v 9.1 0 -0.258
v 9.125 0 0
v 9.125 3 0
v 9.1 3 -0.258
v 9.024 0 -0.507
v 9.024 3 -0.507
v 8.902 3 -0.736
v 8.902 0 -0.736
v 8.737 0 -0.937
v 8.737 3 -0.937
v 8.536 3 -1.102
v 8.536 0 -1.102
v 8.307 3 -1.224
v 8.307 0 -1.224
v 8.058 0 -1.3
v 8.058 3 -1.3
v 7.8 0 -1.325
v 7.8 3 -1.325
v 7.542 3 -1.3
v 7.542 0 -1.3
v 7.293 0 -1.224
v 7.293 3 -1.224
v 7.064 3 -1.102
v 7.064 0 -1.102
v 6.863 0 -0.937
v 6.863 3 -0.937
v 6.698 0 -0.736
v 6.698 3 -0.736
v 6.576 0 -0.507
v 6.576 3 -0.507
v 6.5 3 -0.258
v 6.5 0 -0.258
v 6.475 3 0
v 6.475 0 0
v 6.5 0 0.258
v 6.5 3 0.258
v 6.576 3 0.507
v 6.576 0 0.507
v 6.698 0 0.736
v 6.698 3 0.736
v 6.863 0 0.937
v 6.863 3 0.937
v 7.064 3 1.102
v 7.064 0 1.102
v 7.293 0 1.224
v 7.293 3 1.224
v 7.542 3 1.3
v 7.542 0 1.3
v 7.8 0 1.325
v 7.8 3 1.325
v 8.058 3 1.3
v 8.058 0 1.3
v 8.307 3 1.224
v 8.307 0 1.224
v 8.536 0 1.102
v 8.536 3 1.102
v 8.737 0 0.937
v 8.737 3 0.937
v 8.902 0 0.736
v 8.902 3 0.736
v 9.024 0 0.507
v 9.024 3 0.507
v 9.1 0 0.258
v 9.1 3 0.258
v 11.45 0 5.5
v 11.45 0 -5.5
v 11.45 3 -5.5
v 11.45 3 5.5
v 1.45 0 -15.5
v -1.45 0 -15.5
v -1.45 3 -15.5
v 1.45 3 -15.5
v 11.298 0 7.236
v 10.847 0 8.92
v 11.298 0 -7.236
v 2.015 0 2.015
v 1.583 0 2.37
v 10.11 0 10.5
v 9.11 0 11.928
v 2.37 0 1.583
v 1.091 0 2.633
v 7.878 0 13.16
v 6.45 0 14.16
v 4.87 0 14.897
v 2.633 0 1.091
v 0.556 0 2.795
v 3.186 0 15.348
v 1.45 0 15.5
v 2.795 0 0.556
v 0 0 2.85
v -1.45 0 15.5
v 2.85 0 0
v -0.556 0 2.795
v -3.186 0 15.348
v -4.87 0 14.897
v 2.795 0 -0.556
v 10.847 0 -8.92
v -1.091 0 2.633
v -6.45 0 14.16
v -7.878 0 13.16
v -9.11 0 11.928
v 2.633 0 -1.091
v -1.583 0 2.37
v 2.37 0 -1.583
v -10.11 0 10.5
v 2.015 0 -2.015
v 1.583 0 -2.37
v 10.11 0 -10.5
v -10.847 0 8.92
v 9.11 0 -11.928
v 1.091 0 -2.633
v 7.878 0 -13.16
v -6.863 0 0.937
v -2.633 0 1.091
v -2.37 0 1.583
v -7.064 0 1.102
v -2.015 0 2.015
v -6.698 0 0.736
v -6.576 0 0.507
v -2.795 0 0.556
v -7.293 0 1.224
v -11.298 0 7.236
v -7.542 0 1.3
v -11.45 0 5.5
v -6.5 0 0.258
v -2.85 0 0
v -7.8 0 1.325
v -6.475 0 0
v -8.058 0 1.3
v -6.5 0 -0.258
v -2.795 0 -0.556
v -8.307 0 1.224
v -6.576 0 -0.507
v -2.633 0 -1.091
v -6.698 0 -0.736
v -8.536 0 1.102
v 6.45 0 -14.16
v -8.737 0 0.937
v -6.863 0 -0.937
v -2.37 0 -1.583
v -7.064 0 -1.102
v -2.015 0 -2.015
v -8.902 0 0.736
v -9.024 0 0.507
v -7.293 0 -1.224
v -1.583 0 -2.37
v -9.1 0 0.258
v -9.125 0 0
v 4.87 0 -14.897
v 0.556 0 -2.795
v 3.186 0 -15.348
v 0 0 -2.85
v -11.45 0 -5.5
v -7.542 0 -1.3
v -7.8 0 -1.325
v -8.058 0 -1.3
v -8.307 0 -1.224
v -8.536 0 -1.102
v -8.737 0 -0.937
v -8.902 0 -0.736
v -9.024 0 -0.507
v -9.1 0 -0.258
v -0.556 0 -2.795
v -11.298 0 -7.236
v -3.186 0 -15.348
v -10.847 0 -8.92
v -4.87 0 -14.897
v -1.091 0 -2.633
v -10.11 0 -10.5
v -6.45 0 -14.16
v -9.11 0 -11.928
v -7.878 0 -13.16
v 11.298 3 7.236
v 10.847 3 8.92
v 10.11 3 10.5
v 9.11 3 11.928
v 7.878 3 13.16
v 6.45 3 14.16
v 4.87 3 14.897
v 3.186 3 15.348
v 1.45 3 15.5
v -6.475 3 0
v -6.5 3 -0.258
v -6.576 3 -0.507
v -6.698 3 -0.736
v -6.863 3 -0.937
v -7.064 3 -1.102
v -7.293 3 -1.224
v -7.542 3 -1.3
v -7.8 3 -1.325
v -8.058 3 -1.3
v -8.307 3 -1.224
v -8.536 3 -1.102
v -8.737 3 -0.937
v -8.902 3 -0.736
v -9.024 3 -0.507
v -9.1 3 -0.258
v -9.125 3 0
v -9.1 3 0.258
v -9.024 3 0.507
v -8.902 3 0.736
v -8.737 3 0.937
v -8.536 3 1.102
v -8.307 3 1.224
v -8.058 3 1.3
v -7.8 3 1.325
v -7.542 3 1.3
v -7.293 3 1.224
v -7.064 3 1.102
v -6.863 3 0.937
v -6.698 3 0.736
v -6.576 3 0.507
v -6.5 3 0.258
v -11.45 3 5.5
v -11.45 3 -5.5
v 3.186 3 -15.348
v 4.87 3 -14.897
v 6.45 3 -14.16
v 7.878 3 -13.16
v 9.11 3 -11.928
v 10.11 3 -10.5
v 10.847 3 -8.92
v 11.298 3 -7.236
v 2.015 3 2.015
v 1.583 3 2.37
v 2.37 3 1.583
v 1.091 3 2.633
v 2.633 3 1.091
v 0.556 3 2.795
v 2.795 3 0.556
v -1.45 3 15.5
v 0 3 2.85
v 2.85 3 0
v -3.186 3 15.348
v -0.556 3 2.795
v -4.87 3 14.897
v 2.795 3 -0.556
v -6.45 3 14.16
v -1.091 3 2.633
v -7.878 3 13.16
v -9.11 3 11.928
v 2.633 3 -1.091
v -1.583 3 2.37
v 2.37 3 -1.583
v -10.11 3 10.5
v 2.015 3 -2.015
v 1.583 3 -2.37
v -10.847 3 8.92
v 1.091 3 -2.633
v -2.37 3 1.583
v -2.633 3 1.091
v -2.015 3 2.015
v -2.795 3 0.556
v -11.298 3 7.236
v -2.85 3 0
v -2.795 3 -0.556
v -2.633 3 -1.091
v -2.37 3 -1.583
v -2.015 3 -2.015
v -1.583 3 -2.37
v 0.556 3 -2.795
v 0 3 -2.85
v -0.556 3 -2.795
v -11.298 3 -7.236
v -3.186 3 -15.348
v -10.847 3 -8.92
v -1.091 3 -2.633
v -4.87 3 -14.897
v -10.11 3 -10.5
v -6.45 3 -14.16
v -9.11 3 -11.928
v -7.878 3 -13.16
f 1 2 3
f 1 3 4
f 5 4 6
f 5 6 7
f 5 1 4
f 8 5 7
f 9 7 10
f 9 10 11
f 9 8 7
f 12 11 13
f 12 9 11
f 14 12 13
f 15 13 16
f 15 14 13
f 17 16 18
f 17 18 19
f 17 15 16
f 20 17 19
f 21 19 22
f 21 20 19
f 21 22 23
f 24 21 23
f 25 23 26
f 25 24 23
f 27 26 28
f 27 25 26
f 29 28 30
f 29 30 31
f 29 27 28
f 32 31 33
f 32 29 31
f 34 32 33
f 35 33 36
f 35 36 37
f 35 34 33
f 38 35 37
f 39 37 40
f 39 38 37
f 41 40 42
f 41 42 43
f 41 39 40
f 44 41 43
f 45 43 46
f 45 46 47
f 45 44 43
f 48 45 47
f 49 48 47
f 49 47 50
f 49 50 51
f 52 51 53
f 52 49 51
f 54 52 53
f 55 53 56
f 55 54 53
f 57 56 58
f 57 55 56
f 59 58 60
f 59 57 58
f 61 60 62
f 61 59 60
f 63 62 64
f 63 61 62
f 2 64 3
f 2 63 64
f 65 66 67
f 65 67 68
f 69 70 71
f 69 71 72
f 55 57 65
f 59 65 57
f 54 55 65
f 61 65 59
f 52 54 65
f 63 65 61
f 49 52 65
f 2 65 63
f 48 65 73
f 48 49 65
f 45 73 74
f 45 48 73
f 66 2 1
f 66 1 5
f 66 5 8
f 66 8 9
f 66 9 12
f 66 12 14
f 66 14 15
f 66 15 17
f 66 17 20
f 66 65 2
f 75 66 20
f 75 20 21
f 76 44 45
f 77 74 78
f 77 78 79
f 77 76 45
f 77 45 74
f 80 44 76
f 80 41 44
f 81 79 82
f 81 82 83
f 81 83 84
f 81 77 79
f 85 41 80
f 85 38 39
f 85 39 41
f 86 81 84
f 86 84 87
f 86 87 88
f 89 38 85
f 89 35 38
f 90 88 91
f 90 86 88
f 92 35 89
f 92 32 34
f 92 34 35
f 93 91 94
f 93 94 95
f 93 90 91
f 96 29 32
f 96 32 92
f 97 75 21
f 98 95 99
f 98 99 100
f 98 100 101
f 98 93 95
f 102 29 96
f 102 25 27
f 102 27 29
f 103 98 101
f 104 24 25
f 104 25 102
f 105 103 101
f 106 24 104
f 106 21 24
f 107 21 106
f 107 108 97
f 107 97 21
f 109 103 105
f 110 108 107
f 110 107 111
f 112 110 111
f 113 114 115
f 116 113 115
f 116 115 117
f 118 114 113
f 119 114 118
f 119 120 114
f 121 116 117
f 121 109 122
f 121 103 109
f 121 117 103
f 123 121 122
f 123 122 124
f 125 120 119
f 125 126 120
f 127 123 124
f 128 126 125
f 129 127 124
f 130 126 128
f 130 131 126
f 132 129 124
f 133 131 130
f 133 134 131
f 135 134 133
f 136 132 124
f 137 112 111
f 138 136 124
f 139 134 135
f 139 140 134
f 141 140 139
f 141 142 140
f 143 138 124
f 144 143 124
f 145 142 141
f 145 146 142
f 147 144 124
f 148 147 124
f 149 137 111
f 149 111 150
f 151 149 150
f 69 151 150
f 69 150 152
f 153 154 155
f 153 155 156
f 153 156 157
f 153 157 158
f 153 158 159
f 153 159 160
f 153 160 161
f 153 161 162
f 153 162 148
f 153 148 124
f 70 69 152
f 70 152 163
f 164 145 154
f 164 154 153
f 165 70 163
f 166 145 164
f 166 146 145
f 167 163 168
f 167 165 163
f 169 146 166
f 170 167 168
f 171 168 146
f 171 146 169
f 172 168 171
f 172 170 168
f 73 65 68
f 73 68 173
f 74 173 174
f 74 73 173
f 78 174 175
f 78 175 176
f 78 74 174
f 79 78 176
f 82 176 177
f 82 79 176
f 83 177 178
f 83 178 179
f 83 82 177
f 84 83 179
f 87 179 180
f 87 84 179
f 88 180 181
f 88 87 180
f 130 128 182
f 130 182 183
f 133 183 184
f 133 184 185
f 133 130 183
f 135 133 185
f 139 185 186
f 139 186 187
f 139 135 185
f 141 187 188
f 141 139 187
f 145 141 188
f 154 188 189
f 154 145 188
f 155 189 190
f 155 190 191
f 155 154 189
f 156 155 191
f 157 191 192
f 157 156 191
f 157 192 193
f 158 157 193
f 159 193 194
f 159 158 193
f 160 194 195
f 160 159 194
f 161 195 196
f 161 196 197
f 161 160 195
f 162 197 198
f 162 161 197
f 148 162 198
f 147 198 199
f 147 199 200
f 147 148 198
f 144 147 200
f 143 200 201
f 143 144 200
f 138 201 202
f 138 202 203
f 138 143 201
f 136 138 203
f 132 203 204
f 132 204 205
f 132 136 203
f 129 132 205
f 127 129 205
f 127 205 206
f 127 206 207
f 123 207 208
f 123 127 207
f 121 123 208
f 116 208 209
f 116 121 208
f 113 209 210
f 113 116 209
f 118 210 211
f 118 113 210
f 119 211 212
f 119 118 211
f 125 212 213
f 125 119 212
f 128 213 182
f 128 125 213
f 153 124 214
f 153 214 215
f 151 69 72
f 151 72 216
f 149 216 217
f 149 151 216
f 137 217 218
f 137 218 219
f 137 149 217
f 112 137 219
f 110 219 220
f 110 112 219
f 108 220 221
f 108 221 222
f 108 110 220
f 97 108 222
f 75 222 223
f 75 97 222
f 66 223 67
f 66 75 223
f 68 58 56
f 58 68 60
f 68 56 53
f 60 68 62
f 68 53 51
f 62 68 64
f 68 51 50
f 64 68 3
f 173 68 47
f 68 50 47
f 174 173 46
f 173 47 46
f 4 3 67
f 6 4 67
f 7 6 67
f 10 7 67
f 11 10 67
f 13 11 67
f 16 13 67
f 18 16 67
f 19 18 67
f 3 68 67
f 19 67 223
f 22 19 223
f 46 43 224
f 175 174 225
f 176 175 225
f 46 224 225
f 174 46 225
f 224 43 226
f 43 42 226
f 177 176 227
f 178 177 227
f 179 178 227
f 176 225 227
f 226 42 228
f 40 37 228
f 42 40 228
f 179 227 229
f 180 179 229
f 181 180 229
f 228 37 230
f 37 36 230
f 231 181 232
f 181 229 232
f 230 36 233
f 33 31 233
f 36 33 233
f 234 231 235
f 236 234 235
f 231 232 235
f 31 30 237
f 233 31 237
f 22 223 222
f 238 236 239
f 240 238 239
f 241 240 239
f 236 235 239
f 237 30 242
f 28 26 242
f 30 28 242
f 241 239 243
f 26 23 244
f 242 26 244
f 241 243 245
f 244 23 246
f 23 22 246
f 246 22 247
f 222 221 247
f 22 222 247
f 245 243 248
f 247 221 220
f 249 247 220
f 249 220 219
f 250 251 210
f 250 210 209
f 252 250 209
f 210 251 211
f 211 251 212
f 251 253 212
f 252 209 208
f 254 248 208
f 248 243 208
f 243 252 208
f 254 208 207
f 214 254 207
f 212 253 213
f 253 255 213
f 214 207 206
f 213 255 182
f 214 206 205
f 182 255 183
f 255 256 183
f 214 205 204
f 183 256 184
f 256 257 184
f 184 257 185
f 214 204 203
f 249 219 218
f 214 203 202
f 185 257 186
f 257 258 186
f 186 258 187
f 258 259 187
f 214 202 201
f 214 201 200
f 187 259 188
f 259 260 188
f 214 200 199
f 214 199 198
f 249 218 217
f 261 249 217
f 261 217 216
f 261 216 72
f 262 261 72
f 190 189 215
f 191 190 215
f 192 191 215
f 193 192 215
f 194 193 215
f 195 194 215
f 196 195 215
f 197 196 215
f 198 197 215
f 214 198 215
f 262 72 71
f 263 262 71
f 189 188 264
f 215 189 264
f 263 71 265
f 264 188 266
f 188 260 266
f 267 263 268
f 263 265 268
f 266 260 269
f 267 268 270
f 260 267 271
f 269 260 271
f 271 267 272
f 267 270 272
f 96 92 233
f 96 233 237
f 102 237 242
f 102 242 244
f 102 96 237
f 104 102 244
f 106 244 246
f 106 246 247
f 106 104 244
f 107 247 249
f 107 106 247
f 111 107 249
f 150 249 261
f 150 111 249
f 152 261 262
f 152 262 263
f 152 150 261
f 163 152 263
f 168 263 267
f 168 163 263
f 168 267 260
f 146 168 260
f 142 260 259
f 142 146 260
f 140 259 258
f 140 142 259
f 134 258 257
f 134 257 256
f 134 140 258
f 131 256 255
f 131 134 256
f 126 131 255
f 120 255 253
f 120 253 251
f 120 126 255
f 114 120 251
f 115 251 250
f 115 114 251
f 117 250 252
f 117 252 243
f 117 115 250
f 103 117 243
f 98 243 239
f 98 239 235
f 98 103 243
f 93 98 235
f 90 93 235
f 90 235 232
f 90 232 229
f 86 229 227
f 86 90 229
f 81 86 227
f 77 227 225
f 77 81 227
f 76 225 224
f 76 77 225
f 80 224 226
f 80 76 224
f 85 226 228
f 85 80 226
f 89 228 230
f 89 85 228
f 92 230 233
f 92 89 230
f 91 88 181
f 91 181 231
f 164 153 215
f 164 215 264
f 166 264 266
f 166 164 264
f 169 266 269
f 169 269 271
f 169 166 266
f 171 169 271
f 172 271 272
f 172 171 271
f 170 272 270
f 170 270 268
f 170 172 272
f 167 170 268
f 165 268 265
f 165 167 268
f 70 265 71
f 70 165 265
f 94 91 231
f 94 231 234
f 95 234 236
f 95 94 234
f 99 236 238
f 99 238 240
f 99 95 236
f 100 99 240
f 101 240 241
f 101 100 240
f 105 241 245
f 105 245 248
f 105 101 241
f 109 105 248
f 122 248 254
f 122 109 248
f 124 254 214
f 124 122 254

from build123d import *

# Parameters (mm, degrees)
SKETCH1_R           = 1.325
SKETCH1_R_2         = 2.85
BOSS_EXTRUDE1_DEPTH = 3


with BuildPart() as part:
    # Sketch1 → Boss-Extrude1 (new body)
    with BuildSketch(Plane(origin=(0, 0, 0), x_dir=(1, 0, 0), z_dir=(0, 1, 0))):
        with BuildLine():
            Line((-1.45, 15.5), (1.45, 15.5))
            ThreePointArc((1.45, 15.5), (8.521067812, 12.571067812), (11.45, 5.5))
            Line((11.45, 5.5), (11.45, -5.5))
            ThreePointArc((11.45, -5.5), (8.521067812, -12.571067812), (1.45, -15.5))
            Line((1.45, -15.5), (-1.45, -15.5))
            ThreePointArc((-1.45, -15.5), (-8.521067812, -12.571067812), (-11.45, -5.5))
            Line((-11.45, -5.5), (-11.45, 5.5))
            ThreePointArc((-11.45, 5.5), (-8.521067812, 12.571067812), (-1.45, 15.5))
        make_face()
        with Locations((7.8, 0)):
            Circle(SKETCH1_R, mode=Mode.SUBTRACT)
        with Locations((-7.8, 0)):
            Circle(SKETCH1_R, mode=Mode.SUBTRACT)
        Circle(SKETCH1_R_2, mode=Mode.SUBTRACT)
    extrude(amount=BOSS_EXTRUDE1_DEPTH)


solid = part.part
